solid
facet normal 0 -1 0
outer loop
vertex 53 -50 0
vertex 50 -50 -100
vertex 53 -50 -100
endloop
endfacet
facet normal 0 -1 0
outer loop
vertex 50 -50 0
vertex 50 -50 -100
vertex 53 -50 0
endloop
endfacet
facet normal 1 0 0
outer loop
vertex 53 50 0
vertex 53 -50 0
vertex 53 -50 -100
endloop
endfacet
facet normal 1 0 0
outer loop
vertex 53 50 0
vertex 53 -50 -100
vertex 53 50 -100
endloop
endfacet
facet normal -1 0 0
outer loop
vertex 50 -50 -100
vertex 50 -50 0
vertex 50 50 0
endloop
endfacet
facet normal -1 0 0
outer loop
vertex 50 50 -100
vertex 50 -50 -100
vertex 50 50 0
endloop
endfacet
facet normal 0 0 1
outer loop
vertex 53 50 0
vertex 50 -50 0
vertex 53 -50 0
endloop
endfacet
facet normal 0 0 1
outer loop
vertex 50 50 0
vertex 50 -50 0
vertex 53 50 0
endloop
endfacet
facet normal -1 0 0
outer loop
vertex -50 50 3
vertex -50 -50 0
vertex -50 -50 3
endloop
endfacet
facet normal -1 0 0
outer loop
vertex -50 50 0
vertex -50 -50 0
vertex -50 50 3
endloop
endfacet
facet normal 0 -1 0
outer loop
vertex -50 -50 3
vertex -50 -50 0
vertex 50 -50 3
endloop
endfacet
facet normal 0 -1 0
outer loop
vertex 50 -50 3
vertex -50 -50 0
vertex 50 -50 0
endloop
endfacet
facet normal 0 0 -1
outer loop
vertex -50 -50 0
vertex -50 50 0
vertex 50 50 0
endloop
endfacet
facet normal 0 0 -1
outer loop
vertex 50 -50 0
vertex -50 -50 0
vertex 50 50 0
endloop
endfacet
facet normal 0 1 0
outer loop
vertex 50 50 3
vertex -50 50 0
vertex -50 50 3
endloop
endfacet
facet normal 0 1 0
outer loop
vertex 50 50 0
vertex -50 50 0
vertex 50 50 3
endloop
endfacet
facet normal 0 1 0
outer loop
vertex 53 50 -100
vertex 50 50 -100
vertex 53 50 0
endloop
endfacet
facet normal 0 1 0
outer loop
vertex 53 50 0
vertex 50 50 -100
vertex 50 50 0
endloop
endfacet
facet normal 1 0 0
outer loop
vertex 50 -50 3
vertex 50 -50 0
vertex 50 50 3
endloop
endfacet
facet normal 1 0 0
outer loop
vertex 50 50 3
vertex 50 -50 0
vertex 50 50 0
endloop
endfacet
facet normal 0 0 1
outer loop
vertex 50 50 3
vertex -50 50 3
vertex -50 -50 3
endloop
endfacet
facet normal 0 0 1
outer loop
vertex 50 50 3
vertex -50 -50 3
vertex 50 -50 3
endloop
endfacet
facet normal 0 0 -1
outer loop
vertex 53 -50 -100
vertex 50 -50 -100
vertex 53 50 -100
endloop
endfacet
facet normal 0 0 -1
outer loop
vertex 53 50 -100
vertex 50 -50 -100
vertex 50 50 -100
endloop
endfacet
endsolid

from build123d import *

# Parameters (mm, degrees)
F2_W     = 100
F2_H     = 100
F3_DEPTH = 3
F4_W     = 100
F4_H     = 100
F5_DEPTH = 3


with BuildPart() as f3:
    # F2 (on offset) → F3 (new body)
    with BuildSketch(Plane.YZ.offset(50)):
        with Locations((0, -50)):
            Rectangle(F2_W, F2_H)
    extrude(amount=F3_DEPTH)


with BuildPart() as f5:
    # F4 (on Top) → F5 (new body)
    with BuildSketch(Plane.XY):
        Rectangle(F4_W, F4_H)
    extrude(amount=F5_DEPTH)


solid = Compound([f3.part, f5.part])
